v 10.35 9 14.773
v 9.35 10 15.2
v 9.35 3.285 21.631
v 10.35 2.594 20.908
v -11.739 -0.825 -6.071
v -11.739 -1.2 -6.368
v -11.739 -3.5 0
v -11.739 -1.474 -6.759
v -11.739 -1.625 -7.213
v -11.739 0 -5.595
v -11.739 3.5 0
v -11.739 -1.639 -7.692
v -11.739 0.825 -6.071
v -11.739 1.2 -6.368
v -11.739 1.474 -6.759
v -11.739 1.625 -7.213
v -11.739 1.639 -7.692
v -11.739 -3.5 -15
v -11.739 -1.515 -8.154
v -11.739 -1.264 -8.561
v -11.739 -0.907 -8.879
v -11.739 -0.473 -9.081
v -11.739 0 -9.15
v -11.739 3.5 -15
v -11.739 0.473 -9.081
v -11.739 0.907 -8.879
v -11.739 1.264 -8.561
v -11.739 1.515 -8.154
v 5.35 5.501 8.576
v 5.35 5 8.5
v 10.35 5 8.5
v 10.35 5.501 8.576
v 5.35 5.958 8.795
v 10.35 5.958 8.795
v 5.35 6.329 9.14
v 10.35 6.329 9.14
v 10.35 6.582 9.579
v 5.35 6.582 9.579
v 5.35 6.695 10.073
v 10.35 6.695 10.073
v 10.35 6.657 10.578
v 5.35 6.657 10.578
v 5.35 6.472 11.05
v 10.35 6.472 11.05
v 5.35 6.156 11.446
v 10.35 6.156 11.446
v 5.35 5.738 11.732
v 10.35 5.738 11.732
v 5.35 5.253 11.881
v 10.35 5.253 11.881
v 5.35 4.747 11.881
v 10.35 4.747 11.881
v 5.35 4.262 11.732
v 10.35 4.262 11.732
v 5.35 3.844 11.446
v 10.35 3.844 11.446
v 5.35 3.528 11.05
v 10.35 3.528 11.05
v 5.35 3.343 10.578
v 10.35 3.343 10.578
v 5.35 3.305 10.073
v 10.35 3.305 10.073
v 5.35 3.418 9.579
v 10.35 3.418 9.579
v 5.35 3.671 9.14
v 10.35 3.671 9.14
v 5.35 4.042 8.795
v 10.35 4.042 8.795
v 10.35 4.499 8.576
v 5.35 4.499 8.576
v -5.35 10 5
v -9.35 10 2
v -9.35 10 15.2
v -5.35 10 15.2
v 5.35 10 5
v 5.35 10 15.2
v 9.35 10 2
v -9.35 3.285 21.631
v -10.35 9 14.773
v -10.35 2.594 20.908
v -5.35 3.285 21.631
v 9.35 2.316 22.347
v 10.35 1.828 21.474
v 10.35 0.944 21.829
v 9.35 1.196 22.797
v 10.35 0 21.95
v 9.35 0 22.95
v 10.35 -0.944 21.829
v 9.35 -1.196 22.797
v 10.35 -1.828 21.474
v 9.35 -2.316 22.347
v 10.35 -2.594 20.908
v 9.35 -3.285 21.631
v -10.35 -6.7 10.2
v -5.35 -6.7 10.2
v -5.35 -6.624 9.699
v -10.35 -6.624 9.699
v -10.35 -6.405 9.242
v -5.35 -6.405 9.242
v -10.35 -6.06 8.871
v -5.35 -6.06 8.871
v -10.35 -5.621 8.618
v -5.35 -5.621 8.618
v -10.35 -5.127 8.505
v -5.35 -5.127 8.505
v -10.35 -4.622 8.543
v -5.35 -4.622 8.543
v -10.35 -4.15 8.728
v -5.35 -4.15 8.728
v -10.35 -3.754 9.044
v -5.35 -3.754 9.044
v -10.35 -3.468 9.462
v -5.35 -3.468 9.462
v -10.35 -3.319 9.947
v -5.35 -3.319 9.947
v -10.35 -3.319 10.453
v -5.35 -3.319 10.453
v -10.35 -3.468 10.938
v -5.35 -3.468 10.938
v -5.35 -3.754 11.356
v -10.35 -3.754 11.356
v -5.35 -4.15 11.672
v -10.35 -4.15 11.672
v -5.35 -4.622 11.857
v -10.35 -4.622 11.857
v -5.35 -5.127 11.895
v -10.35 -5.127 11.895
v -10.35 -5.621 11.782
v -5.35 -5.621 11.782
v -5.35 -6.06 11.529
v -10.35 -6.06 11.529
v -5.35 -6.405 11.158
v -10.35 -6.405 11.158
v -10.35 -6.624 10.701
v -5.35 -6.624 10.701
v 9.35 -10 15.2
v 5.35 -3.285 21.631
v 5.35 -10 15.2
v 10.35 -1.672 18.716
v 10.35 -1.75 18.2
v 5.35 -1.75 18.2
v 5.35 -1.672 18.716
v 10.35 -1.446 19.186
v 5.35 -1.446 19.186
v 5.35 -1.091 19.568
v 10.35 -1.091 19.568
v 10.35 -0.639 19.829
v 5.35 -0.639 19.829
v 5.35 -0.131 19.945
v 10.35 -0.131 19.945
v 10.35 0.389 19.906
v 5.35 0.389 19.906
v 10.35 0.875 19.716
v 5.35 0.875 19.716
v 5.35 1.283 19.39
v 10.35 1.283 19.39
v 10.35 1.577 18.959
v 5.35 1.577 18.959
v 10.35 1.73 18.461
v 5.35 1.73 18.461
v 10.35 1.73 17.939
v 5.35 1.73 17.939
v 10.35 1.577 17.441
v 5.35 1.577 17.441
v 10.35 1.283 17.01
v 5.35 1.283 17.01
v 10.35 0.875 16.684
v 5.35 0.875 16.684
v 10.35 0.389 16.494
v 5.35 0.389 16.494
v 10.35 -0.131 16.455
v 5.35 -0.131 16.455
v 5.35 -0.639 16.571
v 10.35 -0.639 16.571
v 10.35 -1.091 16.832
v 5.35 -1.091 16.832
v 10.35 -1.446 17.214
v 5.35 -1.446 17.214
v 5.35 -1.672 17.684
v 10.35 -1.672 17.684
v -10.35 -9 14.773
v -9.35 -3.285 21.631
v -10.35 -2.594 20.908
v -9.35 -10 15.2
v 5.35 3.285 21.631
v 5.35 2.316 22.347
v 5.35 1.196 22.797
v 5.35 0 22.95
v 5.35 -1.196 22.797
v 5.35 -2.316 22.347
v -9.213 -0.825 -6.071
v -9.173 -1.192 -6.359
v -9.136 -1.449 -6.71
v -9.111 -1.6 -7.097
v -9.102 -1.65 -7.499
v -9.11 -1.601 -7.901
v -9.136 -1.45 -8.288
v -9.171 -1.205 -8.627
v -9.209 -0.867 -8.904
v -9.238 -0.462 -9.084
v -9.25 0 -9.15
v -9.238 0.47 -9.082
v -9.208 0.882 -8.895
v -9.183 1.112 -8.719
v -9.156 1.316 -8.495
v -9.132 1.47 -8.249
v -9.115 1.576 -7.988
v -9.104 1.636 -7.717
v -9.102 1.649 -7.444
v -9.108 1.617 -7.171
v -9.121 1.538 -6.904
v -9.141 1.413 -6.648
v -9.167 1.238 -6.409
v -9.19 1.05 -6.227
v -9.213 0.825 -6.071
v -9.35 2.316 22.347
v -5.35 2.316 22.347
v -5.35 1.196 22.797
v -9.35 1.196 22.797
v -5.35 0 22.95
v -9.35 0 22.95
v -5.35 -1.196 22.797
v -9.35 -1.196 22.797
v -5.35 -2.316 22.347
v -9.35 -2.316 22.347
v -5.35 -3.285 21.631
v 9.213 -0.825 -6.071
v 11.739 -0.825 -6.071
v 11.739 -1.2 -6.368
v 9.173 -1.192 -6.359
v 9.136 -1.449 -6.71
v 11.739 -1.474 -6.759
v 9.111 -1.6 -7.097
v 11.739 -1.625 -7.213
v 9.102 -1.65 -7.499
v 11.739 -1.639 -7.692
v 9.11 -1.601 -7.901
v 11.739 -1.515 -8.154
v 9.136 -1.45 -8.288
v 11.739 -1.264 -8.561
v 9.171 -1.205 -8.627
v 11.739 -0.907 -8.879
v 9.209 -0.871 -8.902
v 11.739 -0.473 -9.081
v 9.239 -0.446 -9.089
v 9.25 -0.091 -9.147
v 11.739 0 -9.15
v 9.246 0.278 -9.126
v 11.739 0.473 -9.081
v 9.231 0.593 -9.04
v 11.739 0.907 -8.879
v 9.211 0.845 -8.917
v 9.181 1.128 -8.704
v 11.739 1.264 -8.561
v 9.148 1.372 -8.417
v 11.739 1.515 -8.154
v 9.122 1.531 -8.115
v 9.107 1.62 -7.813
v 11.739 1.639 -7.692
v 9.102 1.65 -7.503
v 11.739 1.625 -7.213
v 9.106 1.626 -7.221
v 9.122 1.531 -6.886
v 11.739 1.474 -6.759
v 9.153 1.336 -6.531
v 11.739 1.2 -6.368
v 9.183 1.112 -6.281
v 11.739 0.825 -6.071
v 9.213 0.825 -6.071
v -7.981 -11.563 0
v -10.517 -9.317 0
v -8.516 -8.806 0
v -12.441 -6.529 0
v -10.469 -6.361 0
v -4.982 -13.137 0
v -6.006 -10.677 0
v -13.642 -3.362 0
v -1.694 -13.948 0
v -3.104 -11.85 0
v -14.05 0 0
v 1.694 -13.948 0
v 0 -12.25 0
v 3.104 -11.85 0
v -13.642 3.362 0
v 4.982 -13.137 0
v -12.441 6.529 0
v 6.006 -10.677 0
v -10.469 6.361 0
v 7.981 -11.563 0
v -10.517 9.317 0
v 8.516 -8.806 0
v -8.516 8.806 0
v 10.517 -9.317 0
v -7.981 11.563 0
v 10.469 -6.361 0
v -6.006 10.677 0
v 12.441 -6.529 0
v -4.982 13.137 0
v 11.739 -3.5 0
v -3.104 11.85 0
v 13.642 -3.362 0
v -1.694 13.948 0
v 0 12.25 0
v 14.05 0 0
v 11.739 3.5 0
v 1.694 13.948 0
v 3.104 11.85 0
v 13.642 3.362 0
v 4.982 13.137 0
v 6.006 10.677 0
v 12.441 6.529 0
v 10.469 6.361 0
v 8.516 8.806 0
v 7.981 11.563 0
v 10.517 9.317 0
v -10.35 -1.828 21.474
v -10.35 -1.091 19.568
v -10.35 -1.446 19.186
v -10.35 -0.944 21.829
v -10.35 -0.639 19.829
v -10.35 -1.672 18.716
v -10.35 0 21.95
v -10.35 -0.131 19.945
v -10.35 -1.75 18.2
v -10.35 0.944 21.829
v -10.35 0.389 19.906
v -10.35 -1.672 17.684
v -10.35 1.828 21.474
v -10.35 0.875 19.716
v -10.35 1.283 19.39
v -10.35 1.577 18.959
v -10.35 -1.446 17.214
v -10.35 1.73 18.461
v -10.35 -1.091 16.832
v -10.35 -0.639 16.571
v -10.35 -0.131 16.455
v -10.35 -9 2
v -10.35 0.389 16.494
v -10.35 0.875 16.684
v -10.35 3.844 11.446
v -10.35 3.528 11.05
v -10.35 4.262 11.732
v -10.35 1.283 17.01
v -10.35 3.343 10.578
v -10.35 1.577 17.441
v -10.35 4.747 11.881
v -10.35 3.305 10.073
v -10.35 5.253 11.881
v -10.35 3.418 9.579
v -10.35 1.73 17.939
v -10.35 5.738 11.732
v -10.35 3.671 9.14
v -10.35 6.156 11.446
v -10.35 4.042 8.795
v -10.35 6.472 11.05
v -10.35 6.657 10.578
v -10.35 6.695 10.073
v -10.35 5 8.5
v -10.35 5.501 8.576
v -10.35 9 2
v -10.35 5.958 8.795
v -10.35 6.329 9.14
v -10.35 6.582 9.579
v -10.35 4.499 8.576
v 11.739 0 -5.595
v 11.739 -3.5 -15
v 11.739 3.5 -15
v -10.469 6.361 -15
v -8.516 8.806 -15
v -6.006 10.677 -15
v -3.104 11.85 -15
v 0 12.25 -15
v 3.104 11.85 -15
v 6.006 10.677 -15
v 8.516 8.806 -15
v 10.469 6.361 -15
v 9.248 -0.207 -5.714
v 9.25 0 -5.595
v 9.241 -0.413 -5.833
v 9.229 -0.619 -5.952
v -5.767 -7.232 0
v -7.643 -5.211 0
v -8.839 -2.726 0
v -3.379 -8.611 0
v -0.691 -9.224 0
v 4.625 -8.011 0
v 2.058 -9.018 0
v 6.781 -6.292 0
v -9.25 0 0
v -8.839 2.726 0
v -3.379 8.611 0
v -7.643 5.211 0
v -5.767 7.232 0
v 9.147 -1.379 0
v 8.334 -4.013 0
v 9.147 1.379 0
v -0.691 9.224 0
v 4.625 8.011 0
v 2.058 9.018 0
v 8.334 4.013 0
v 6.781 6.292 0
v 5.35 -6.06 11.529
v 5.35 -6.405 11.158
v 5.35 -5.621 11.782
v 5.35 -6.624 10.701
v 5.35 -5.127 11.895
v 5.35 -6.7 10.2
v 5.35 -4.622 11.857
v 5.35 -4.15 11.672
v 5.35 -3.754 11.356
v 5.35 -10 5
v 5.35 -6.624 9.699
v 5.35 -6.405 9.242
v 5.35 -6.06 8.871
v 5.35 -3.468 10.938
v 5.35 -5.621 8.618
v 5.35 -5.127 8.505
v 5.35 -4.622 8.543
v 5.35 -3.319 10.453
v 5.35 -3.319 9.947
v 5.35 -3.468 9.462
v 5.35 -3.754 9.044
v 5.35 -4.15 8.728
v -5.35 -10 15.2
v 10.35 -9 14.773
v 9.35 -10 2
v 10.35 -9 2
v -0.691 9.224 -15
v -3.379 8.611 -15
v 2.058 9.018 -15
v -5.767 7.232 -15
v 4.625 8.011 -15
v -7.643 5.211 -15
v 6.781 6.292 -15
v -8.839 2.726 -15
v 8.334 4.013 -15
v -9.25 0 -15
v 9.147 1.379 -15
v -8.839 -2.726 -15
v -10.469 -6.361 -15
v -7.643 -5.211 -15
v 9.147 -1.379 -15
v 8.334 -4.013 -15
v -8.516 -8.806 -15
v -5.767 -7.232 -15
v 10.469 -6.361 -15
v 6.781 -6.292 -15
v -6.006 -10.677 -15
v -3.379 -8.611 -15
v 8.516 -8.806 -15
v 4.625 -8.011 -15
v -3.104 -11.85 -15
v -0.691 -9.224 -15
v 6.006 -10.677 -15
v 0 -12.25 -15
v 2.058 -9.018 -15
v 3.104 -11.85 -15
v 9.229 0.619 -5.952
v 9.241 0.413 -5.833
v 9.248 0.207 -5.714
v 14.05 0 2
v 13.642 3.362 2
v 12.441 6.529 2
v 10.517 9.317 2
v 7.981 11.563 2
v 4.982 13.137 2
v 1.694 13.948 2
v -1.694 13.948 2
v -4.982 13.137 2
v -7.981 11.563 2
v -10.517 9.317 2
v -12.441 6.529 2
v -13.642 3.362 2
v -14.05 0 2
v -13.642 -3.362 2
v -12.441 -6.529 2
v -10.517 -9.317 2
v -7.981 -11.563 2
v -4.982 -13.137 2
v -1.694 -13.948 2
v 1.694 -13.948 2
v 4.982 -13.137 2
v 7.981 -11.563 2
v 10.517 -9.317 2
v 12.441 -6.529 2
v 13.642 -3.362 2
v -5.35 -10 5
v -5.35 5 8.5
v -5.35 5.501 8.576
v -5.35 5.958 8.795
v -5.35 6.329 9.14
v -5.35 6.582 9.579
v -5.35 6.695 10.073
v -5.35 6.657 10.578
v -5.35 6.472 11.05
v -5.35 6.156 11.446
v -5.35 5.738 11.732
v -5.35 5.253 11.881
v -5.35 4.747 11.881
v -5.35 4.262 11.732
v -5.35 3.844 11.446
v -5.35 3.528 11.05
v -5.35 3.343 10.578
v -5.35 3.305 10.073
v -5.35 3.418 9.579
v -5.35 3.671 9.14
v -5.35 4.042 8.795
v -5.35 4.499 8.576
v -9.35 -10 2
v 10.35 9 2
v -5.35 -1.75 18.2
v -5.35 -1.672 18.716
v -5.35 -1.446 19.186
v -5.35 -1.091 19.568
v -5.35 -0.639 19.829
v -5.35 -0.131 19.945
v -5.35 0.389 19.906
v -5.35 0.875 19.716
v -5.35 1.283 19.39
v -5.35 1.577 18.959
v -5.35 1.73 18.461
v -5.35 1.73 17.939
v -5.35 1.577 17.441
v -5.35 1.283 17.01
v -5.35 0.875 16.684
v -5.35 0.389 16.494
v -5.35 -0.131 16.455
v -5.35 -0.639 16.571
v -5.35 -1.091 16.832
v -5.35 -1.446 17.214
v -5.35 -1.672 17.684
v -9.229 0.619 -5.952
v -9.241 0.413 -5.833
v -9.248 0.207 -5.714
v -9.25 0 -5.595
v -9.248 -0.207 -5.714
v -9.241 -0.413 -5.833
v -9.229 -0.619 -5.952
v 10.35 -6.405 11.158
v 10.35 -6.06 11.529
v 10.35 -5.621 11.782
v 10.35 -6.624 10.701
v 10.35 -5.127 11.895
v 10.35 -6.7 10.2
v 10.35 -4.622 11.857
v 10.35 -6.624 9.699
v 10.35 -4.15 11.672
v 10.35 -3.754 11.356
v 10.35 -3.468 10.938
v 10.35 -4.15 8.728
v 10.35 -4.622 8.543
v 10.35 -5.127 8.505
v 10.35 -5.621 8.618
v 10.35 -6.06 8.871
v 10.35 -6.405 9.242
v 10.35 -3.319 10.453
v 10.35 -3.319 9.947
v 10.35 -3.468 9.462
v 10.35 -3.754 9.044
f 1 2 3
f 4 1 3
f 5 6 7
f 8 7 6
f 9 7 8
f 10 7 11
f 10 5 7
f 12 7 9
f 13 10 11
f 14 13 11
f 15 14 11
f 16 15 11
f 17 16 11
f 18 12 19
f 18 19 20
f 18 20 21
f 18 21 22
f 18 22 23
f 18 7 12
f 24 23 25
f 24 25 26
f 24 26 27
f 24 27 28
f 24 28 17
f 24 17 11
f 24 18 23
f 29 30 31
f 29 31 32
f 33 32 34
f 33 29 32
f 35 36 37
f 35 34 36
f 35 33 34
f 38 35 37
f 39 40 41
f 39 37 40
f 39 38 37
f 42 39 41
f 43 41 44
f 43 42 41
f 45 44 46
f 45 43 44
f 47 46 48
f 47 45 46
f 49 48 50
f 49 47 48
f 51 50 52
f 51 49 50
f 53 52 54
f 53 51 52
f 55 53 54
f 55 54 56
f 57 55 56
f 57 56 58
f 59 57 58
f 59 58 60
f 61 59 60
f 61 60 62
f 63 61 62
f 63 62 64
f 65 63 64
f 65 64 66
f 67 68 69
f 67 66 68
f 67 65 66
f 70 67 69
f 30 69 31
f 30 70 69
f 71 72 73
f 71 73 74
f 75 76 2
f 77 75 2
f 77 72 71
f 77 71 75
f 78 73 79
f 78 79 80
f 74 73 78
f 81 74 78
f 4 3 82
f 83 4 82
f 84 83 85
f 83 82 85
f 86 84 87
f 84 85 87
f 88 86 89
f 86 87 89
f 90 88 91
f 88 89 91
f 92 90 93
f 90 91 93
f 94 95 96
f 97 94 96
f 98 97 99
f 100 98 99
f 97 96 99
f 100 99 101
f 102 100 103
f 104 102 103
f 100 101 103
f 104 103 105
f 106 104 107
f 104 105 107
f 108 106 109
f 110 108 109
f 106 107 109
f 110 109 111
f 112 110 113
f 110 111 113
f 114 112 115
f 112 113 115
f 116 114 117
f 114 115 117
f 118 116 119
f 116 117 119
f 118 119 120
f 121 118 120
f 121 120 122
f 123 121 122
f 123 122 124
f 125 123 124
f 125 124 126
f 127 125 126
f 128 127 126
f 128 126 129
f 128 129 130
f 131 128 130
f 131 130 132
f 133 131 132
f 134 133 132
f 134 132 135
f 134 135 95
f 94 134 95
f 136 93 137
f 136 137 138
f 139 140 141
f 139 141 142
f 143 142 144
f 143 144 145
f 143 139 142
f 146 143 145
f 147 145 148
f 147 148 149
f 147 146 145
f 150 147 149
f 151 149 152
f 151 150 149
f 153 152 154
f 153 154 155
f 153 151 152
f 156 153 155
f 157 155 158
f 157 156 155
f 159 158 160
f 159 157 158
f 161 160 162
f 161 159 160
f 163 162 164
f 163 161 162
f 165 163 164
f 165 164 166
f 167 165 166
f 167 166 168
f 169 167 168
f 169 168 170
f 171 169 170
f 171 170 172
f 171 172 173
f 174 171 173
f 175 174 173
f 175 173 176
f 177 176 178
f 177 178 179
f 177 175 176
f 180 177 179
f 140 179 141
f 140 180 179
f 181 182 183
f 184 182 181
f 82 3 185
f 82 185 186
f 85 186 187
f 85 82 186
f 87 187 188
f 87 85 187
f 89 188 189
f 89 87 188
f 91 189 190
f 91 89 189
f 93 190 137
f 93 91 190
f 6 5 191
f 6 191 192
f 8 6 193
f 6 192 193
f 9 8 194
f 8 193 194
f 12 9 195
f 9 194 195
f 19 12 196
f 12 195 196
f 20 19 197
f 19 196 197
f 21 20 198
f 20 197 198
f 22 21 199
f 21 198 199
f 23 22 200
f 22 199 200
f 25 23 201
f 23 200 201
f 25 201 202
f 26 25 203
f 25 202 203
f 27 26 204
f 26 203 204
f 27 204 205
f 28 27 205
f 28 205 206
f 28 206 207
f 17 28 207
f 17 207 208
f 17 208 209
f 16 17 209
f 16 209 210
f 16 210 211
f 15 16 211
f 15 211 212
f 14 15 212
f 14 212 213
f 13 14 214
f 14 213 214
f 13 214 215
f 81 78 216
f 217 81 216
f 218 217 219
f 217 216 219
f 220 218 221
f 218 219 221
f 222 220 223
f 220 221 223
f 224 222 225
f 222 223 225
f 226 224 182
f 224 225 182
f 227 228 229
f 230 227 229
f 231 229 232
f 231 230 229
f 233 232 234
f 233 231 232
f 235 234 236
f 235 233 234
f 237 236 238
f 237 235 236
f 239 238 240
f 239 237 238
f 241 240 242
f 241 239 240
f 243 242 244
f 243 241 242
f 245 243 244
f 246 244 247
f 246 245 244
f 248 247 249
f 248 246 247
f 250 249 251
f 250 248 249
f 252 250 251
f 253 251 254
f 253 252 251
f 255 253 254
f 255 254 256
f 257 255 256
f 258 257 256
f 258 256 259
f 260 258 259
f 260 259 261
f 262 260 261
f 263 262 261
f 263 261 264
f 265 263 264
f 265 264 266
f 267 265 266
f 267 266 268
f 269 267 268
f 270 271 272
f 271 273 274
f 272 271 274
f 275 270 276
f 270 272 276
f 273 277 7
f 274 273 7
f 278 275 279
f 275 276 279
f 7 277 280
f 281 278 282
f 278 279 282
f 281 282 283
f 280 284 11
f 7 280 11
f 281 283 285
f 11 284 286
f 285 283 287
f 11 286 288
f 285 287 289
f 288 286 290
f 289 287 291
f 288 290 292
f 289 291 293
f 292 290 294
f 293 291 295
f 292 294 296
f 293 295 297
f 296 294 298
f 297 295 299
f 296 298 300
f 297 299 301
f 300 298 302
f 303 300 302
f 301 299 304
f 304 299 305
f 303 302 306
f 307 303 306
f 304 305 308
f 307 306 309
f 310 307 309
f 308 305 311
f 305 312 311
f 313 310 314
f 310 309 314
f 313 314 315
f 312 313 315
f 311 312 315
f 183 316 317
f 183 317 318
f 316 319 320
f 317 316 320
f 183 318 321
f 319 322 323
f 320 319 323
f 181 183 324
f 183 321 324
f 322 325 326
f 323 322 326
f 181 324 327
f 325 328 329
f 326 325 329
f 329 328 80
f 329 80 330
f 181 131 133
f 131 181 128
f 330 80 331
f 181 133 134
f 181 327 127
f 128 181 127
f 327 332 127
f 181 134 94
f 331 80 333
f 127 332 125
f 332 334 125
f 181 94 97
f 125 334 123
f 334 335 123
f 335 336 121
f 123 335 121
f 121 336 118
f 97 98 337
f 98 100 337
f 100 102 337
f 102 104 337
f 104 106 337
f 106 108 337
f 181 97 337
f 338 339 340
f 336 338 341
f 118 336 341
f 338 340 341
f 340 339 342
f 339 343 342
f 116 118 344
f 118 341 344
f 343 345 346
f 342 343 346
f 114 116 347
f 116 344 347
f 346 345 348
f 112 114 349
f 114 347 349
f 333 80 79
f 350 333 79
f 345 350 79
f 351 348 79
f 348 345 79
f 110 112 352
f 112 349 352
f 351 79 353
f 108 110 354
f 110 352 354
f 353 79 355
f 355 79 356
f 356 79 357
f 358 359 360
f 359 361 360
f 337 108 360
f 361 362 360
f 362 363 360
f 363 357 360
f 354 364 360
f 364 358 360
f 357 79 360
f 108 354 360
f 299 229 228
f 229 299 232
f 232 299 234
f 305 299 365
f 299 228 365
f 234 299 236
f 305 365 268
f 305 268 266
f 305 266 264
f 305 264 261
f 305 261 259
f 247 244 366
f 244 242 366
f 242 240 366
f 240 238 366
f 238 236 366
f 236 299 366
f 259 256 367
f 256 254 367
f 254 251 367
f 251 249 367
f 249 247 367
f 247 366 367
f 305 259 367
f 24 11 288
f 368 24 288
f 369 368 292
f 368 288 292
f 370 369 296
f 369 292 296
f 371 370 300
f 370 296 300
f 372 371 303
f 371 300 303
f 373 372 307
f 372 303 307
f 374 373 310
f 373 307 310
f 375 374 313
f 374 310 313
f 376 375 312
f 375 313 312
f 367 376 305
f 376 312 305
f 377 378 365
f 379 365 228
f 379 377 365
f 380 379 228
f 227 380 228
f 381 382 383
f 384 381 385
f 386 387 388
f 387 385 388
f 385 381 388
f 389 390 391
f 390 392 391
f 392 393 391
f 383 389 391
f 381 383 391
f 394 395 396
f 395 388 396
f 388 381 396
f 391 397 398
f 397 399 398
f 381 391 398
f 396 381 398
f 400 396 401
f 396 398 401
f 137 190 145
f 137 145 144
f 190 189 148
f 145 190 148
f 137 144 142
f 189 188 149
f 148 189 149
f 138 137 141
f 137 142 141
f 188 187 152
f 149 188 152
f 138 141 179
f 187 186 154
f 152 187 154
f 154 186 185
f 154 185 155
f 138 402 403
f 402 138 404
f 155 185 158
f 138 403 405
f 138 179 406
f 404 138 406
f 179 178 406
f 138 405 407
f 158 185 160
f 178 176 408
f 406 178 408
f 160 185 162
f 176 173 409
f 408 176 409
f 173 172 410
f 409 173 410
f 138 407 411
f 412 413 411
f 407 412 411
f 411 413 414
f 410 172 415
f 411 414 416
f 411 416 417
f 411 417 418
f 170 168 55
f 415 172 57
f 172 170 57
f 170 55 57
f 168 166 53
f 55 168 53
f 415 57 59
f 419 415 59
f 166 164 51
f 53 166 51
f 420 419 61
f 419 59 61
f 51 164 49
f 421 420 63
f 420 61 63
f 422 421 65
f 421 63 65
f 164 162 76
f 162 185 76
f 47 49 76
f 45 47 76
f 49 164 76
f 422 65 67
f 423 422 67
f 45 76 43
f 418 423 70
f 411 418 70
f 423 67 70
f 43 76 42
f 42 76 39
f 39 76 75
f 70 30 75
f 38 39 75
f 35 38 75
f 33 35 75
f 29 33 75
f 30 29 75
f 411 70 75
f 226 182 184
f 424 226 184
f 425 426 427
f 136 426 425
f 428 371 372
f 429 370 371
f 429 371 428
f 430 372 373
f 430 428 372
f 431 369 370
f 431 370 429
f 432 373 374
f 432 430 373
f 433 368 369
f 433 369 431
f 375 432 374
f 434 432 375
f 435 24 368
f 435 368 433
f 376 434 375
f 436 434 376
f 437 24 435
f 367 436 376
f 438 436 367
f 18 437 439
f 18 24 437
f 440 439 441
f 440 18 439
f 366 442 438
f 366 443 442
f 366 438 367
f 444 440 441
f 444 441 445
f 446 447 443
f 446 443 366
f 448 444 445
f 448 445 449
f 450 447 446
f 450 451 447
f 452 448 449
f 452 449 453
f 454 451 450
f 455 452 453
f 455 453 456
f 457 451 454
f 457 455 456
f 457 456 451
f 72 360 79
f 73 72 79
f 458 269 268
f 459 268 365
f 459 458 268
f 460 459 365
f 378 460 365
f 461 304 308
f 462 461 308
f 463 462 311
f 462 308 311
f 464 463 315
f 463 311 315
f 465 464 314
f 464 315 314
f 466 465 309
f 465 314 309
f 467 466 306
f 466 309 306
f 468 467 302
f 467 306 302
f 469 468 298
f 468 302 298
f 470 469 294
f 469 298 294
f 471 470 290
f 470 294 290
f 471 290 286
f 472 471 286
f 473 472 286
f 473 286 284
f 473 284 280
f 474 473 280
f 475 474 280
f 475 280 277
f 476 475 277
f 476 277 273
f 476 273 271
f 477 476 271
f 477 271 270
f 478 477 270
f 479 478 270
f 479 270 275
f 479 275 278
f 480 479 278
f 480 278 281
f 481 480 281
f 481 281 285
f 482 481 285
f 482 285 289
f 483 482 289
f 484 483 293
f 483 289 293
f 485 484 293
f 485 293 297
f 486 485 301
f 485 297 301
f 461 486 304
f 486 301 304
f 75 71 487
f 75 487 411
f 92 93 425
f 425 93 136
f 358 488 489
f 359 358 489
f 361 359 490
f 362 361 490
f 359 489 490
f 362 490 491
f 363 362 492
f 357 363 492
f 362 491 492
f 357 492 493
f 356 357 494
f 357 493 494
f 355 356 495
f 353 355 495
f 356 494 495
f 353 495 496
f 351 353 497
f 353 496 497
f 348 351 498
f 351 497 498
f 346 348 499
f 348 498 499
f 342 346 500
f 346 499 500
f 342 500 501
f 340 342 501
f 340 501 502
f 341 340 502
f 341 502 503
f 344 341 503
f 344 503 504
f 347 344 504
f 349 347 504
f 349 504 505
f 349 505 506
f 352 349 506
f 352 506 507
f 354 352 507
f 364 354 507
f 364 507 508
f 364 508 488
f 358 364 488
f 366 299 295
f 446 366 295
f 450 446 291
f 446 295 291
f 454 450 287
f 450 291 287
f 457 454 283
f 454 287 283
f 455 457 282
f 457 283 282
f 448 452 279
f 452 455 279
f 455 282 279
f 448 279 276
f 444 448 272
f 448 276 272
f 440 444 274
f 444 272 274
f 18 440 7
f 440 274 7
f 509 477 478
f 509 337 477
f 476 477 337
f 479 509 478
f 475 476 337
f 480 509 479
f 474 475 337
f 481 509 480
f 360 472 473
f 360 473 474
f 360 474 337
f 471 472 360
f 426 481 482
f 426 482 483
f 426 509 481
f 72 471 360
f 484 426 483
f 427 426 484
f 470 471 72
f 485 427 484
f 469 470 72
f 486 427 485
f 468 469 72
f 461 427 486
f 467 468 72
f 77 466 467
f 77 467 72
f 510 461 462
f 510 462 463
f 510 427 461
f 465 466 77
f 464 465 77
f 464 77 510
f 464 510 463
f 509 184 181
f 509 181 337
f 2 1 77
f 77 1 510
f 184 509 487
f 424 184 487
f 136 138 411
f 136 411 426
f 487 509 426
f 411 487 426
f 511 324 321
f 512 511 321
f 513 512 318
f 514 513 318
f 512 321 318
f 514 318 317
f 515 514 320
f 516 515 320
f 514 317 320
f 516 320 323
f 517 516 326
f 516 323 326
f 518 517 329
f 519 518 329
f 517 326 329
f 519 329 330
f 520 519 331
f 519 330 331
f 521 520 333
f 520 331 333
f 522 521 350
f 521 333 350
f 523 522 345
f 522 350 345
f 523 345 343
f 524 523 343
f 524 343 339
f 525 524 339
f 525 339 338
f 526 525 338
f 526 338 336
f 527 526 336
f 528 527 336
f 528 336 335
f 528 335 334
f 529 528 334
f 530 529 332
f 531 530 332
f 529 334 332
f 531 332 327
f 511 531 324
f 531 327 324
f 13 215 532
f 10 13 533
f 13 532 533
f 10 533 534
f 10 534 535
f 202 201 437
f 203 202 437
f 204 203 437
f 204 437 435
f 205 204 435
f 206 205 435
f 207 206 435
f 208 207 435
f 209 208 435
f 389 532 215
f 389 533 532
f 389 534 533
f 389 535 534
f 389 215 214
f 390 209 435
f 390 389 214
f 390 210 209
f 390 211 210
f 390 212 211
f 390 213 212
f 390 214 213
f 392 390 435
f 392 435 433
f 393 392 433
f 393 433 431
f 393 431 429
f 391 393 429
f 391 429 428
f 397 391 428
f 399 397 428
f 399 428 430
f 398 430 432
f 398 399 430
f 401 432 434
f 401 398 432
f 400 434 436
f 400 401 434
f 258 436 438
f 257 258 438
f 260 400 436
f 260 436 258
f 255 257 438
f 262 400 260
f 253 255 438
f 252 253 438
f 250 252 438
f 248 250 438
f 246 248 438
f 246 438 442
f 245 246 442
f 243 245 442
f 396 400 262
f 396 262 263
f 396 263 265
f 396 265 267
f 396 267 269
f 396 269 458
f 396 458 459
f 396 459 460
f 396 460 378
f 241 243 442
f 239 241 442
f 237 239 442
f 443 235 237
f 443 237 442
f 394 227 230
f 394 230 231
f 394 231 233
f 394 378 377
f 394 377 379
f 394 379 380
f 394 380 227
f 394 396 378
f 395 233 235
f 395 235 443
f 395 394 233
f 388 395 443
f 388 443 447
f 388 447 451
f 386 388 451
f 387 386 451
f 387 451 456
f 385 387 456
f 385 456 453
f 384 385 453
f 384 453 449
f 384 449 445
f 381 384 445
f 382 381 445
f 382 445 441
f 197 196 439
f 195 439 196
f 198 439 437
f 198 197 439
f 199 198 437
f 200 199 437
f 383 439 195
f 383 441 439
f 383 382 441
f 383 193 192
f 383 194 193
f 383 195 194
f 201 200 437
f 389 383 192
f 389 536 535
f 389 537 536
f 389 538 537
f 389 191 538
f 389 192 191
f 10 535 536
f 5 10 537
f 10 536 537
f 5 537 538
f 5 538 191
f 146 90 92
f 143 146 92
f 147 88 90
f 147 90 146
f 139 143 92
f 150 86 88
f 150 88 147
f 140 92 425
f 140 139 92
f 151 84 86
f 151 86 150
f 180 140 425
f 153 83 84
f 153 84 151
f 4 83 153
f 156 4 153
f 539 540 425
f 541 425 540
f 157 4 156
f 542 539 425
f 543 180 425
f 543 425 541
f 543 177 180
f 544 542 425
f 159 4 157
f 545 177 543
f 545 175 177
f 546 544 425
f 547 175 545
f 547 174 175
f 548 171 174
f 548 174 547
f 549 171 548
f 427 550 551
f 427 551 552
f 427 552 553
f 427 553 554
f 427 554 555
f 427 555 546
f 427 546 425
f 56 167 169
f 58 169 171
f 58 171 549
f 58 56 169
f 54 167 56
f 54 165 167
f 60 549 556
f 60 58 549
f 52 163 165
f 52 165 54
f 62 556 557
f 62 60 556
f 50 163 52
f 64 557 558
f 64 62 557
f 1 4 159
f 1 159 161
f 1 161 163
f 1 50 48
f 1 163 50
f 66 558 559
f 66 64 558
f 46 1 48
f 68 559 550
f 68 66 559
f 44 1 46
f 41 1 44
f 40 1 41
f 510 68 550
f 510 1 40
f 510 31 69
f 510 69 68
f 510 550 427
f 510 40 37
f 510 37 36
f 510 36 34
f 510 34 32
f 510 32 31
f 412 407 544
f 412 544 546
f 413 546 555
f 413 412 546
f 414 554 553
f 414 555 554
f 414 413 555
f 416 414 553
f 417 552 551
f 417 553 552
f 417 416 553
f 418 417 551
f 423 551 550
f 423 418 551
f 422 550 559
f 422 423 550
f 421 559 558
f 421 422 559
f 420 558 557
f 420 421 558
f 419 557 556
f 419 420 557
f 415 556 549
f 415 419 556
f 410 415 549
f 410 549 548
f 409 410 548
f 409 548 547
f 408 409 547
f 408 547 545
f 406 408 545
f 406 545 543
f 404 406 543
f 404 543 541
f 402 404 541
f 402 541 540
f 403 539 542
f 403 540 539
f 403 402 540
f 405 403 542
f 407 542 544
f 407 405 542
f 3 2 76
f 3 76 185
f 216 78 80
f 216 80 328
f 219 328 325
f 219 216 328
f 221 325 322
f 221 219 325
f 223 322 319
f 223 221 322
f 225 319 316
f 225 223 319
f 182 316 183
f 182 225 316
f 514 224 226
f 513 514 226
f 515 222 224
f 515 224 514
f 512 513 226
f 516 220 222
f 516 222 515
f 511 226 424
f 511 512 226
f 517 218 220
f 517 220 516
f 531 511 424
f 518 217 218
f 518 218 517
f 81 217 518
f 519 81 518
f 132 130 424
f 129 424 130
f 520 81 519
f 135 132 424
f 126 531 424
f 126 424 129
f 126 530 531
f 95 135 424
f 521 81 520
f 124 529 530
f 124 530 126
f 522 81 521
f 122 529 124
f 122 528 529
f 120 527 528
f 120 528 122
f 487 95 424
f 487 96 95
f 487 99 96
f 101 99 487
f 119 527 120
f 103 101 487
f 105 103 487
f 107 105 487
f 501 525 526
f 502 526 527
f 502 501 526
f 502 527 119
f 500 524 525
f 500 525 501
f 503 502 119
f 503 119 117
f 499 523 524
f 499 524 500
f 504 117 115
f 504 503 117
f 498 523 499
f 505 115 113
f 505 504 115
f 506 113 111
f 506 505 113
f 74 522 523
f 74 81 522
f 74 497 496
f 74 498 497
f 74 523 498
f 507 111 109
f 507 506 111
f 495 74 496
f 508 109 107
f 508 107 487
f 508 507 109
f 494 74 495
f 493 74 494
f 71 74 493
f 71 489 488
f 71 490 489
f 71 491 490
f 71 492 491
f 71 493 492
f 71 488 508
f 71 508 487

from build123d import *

# Parameters (mm, degrees)
SKETCH_1_R               = 6.325
EXTRUDE_1_DEPTH          = 15
SKETCH_2_W               = 20.7
SKETCH_2_H               = 20
EXTRUDE_2_DEPTH          = 5
SKETCH_3_W               = 5
SKETCH_3_H               = 20
EXTRUDE_3_DEPTH          = 10.2
SKETCH_4_R               = 1.7
CUT_EXTRUDE_1_DEPTH      = 21.932331452
CUT_EXTRUDE_1_DEPTH_BACK = 21.932331452
SKETCH_5_R               = 1.65
CUT_EXTRUDE_2_DEPTH      = 21.932331452
CUT_EXTRUDE_2_DEPTH_BACK = 21.932331452
SKETCH_6_R               = 1.75
EXTRUDE_4_DEPTH          = 5
CHAMFER_2_SIZE           = 1
CHAMFER_3_SIZE           = 1
CUT_EXTRUDE_3_DEPTH      = 33.153149146
CUT_EXTRUDE_3_DEPTH_BACK = 33.153149146
SKETCH_9_R               = 12.25
SKETCH_9_R_2             = 9.25
EXTRUDE_5_DEPTH          = 15
SKETCH_10_R              = 14.05
EXTRUDE_6_DEPTH          = 2
CUT_EXTRUDE_4_DEPTH      = 31.356342006
CUT_EXTRUDE_4_DEPTH_BACK = 31.356342006
CUT_EXTRUDE_5_REACH      = 44.837
SKETCH_12_W              = 4.440498429
SKETCH_12_H              = 7
SKETCH_12_W_2            = 5.469845286


with BuildPart() as part:
    # ｽｹｯﾁ1 → ﾎﾞｽ - 押し出し1 (new body)
    with BuildSketch(Plane.XY):
        Circle(SKETCH_1_R)
    extrude(amount=-EXTRUDE_1_DEPTH)

    # ｽｹｯﾁ2 → ﾎﾞｽ - 押し出し2 (add)
    with BuildSketch(Plane.XY):
        Rectangle(SKETCH_2_W, SKETCH_2_H)
    extrude(amount=EXTRUDE_2_DEPTH)

    # ｽｹｯﾁ3 → ﾎﾞｽ - 押し出し3 (add)
    with BuildSketch(Plane.XY.offset(5)):
        with Locations((7.85, 0)):
            Rectangle(SKETCH_3_W, SKETCH_3_H)
        with Locations((-7.85, 0)):
            Rectangle(SKETCH_3_W, SKETCH_3_H)
    extrude(amount=EXTRUDE_3_DEPTH)

    # ｽｹｯﾁ4 → ｶｯﾄ - 押し出し1 (cut, two sides)
    with BuildSketch(Plane(origin=(0, 0, 0), x_dir=(0, 0, -1), z_dir=(1, 0, 0))) as cut_extrude_1_sk:
        with Locations((-10.2, 5)):
            Circle(SKETCH_4_R)
        with Locations(Location((-10.2, -5, 0), (0, 0, 270))):
            Circle(SKETCH_4_R)
    extrude(amount=CUT_EXTRUDE_1_DEPTH, mode=Mode.SUBTRACT)
    extrude(cut_extrude_1_sk.sketch, amount=-CUT_EXTRUDE_1_DEPTH_BACK, mode=Mode.SUBTRACT)

    # ｽｹｯﾁ5 → ｶｯﾄ - 押し出し2 (cut, two sides)
    with BuildSketch(Plane(origin=(0, 0, 0), x_dir=(0, 0, -1), z_dir=(1, 0, 0))) as cut_extrude_2_sk:
        with Locations((7.5, 0)):
            Circle(SKETCH_5_R)
    extrude(amount=CUT_EXTRUDE_2_DEPTH, mode=Mode.SUBTRACT)
    extrude(cut_extrude_2_sk.sketch, amount=-CUT_EXTRUDE_2_DEPTH_BACK, mode=Mode.SUBTRACT)

    # ｽｹｯﾁ6 → ﾎﾞｽ - 押し出し4 (add)
    with BuildSketch(Plane.ZY.offset(10.35)):
        with BuildLine():
            Line((15.2, 10), (21.630535845, 3.285410753))
            ThreePointArc((21.630535845, 3.285410753), (22.95, 0), (21.630535845, -3.285410753))
            Line((21.630535845, -3.285410753), (15.2, -10))
            Line((15.2, -10), (15.2, 10))
        make_face()
        with Locations(Location((18.2, 0, 0), (0, 0, 270))):
            Circle(SKETCH_6_R, mode=Mode.SUBTRACT)
    extrude_4 = extrude(amount=-EXTRUDE_4_DEPTH)

    # ﾐﾗｰ1: ﾎﾞｽ - 押し出し4 across plane
    add(extrude_4.mirror(Plane(origin=(0, 0, 0), x_dir=(0, 0, 1), z_dir=(1, 0, 0))))

    # 面取り2
    chamfer_2_edges = [part.edges().sort_by_distance(p)[0] for p in [
        (10.35, -10, 7.6),
        (10.35, 10, 7.6),
        (-10.35, -6.642705377, 18.415267922),
        (-10.35, 0, 22.95),
        (-10.35, 6.642705377, 18.415267922),
        (-10.35, 10, 7.6),
        (-10.35, -10, 7.6),
        (10.35, -6.642705377, 18.415267922),
        (10.35, 0, 22.95),
        (10.35, 6.642705377, 18.415267922),
    ]]
    chamfer(chamfer_2_edges, length=CHAMFER_2_SIZE)

    # 面取り3
    chamfer_3_edges = [part.edges().sort_by_distance(p)[0] for p in [
        (-6.325, 0, -15),
    ]]
    chamfer(chamfer_3_edges, length=CHAMFER_3_SIZE)

    # ｽｹｯﾁ8 → ｶｯﾄ - 押し出し3 (cut, two sides)
    with BuildSketch(Plane(origin=(0, 10, 0), x_dir=(1, 0, 0), z_dir=(0, 1, 0))) as cut_extrude_3_sk:
        Polygon((-104.749244062, 0), (-16.325065883, 0), (21.444424523, 0), (109.868602701, 0), (109.868602701, 176.848356357), (-104.749244062, 176.848356357), align=None)
    extrude(amount=CUT_EXTRUDE_3_DEPTH, mode=Mode.SUBTRACT)
    extrude(cut_extrude_3_sk.sketch, amount=-CUT_EXTRUDE_3_DEPTH_BACK, mode=Mode.SUBTRACT)

    # ｽｹｯﾁ9 → ﾎﾞｽ - 押し出し5 (add)
    with BuildSketch(Plane(origin=(0, 0, 0), x_dir=(-1, 0, 0), z_dir=(0, 0, -1))):
        with Locations(Location((0, 0, 0), (0, 0, 212.338995303))):
            Circle(SKETCH_9_R)
        Circle(SKETCH_9_R_2, mode=Mode.SUBTRACT)
    extrude(amount=EXTRUDE_5_DEPTH)

    # ｽｹｯﾁ10 → ﾎﾞｽ - 押し出し6 (add)
    with BuildSketch(Plane.XY):
        Circle(SKETCH_10_R)
    extrude(amount=EXTRUDE_6_DEPTH)

    # ｽｹｯﾁ11 → ｶｯﾄ - 押し出し4 (cut, two sides)
    with BuildSketch(Plane(origin=(0, 0, 0), x_dir=(0, 0, -1), z_dir=(1, 0, 0))) as cut_extrude_4_sk:
        with BuildLine():
            Line((6.071058084, 0.825), (5.594744112, 0))
            Line((5.594744112, 0), (6.071058084, -0.825))
            ThreePointArc((6.071058084, -0.825), (9.15, 0), (6.071058084, 0.825))
        make_face()
    extrude(amount=CUT_EXTRUDE_4_DEPTH, mode=Mode.SUBTRACT)
    extrude(cut_extrude_4_sk.sketch, amount=-CUT_EXTRUDE_4_DEPTH_BACK, mode=Mode.SUBTRACT)

    # ｶｯﾄ - 押し出し5: up to this face of the body (flat: up to its plane)
    cut_extrude_5_end = Plane(part.part.faces().sort_by_distance((-10.685757389, 6.765438958, 0))[0])
    # ｽｹｯﾁ12 → ｶｯﾄ - 押し出し5 (cut, up to the picked face)
    with BuildSketch(Plane(origin=(0, 0, -15), x_dir=(-1, 0, 0), z_dir=(0, 0, -1)), mode=Mode.PRIVATE) as cut_extrude_5_sk1:
        with Locations((-13.959606096, 0)):
            Rectangle(SKETCH_12_W, SKETCH_12_H)
    cut_extrude_5_tool1 = split(extrude(cut_extrude_5_sk1.sketch, amount=-CUT_EXTRUDE_5_REACH, mode=Mode.PRIVATE), bisect_by=cut_extrude_5_end, keep=Keep.BOTH, mode=Mode.PRIVATE)
    # ｽｹｯﾁ12 → ｶｯﾄ - 押し出し5 (cut, up to the picked face)
    with BuildSketch(Plane(origin=(0, 0, -15), x_dir=(-1, 0, 0), z_dir=(0, 0, -1)), mode=Mode.PRIVATE) as cut_extrude_5_sk2:
        with Locations((14.474279525, 0)):
            Rectangle(SKETCH_12_W_2, SKETCH_12_H)
    cut_extrude_5_tool2 = split(extrude(cut_extrude_5_sk2.sketch, amount=-CUT_EXTRUDE_5_REACH, mode=Mode.PRIVATE), bisect_by=cut_extrude_5_end, keep=Keep.BOTH, mode=Mode.PRIVATE)
    add(cut_extrude_5_tool1.solids().sort_by(Axis((13.959606, 0, -15), (0, 0, 1)))[0], mode=Mode.SUBTRACT)
    add(cut_extrude_5_tool2.solids().sort_by(Axis((-14.47428, 0, -15), (0, 0, 1)))[0], mode=Mode.SUBTRACT)


solid = part.part
